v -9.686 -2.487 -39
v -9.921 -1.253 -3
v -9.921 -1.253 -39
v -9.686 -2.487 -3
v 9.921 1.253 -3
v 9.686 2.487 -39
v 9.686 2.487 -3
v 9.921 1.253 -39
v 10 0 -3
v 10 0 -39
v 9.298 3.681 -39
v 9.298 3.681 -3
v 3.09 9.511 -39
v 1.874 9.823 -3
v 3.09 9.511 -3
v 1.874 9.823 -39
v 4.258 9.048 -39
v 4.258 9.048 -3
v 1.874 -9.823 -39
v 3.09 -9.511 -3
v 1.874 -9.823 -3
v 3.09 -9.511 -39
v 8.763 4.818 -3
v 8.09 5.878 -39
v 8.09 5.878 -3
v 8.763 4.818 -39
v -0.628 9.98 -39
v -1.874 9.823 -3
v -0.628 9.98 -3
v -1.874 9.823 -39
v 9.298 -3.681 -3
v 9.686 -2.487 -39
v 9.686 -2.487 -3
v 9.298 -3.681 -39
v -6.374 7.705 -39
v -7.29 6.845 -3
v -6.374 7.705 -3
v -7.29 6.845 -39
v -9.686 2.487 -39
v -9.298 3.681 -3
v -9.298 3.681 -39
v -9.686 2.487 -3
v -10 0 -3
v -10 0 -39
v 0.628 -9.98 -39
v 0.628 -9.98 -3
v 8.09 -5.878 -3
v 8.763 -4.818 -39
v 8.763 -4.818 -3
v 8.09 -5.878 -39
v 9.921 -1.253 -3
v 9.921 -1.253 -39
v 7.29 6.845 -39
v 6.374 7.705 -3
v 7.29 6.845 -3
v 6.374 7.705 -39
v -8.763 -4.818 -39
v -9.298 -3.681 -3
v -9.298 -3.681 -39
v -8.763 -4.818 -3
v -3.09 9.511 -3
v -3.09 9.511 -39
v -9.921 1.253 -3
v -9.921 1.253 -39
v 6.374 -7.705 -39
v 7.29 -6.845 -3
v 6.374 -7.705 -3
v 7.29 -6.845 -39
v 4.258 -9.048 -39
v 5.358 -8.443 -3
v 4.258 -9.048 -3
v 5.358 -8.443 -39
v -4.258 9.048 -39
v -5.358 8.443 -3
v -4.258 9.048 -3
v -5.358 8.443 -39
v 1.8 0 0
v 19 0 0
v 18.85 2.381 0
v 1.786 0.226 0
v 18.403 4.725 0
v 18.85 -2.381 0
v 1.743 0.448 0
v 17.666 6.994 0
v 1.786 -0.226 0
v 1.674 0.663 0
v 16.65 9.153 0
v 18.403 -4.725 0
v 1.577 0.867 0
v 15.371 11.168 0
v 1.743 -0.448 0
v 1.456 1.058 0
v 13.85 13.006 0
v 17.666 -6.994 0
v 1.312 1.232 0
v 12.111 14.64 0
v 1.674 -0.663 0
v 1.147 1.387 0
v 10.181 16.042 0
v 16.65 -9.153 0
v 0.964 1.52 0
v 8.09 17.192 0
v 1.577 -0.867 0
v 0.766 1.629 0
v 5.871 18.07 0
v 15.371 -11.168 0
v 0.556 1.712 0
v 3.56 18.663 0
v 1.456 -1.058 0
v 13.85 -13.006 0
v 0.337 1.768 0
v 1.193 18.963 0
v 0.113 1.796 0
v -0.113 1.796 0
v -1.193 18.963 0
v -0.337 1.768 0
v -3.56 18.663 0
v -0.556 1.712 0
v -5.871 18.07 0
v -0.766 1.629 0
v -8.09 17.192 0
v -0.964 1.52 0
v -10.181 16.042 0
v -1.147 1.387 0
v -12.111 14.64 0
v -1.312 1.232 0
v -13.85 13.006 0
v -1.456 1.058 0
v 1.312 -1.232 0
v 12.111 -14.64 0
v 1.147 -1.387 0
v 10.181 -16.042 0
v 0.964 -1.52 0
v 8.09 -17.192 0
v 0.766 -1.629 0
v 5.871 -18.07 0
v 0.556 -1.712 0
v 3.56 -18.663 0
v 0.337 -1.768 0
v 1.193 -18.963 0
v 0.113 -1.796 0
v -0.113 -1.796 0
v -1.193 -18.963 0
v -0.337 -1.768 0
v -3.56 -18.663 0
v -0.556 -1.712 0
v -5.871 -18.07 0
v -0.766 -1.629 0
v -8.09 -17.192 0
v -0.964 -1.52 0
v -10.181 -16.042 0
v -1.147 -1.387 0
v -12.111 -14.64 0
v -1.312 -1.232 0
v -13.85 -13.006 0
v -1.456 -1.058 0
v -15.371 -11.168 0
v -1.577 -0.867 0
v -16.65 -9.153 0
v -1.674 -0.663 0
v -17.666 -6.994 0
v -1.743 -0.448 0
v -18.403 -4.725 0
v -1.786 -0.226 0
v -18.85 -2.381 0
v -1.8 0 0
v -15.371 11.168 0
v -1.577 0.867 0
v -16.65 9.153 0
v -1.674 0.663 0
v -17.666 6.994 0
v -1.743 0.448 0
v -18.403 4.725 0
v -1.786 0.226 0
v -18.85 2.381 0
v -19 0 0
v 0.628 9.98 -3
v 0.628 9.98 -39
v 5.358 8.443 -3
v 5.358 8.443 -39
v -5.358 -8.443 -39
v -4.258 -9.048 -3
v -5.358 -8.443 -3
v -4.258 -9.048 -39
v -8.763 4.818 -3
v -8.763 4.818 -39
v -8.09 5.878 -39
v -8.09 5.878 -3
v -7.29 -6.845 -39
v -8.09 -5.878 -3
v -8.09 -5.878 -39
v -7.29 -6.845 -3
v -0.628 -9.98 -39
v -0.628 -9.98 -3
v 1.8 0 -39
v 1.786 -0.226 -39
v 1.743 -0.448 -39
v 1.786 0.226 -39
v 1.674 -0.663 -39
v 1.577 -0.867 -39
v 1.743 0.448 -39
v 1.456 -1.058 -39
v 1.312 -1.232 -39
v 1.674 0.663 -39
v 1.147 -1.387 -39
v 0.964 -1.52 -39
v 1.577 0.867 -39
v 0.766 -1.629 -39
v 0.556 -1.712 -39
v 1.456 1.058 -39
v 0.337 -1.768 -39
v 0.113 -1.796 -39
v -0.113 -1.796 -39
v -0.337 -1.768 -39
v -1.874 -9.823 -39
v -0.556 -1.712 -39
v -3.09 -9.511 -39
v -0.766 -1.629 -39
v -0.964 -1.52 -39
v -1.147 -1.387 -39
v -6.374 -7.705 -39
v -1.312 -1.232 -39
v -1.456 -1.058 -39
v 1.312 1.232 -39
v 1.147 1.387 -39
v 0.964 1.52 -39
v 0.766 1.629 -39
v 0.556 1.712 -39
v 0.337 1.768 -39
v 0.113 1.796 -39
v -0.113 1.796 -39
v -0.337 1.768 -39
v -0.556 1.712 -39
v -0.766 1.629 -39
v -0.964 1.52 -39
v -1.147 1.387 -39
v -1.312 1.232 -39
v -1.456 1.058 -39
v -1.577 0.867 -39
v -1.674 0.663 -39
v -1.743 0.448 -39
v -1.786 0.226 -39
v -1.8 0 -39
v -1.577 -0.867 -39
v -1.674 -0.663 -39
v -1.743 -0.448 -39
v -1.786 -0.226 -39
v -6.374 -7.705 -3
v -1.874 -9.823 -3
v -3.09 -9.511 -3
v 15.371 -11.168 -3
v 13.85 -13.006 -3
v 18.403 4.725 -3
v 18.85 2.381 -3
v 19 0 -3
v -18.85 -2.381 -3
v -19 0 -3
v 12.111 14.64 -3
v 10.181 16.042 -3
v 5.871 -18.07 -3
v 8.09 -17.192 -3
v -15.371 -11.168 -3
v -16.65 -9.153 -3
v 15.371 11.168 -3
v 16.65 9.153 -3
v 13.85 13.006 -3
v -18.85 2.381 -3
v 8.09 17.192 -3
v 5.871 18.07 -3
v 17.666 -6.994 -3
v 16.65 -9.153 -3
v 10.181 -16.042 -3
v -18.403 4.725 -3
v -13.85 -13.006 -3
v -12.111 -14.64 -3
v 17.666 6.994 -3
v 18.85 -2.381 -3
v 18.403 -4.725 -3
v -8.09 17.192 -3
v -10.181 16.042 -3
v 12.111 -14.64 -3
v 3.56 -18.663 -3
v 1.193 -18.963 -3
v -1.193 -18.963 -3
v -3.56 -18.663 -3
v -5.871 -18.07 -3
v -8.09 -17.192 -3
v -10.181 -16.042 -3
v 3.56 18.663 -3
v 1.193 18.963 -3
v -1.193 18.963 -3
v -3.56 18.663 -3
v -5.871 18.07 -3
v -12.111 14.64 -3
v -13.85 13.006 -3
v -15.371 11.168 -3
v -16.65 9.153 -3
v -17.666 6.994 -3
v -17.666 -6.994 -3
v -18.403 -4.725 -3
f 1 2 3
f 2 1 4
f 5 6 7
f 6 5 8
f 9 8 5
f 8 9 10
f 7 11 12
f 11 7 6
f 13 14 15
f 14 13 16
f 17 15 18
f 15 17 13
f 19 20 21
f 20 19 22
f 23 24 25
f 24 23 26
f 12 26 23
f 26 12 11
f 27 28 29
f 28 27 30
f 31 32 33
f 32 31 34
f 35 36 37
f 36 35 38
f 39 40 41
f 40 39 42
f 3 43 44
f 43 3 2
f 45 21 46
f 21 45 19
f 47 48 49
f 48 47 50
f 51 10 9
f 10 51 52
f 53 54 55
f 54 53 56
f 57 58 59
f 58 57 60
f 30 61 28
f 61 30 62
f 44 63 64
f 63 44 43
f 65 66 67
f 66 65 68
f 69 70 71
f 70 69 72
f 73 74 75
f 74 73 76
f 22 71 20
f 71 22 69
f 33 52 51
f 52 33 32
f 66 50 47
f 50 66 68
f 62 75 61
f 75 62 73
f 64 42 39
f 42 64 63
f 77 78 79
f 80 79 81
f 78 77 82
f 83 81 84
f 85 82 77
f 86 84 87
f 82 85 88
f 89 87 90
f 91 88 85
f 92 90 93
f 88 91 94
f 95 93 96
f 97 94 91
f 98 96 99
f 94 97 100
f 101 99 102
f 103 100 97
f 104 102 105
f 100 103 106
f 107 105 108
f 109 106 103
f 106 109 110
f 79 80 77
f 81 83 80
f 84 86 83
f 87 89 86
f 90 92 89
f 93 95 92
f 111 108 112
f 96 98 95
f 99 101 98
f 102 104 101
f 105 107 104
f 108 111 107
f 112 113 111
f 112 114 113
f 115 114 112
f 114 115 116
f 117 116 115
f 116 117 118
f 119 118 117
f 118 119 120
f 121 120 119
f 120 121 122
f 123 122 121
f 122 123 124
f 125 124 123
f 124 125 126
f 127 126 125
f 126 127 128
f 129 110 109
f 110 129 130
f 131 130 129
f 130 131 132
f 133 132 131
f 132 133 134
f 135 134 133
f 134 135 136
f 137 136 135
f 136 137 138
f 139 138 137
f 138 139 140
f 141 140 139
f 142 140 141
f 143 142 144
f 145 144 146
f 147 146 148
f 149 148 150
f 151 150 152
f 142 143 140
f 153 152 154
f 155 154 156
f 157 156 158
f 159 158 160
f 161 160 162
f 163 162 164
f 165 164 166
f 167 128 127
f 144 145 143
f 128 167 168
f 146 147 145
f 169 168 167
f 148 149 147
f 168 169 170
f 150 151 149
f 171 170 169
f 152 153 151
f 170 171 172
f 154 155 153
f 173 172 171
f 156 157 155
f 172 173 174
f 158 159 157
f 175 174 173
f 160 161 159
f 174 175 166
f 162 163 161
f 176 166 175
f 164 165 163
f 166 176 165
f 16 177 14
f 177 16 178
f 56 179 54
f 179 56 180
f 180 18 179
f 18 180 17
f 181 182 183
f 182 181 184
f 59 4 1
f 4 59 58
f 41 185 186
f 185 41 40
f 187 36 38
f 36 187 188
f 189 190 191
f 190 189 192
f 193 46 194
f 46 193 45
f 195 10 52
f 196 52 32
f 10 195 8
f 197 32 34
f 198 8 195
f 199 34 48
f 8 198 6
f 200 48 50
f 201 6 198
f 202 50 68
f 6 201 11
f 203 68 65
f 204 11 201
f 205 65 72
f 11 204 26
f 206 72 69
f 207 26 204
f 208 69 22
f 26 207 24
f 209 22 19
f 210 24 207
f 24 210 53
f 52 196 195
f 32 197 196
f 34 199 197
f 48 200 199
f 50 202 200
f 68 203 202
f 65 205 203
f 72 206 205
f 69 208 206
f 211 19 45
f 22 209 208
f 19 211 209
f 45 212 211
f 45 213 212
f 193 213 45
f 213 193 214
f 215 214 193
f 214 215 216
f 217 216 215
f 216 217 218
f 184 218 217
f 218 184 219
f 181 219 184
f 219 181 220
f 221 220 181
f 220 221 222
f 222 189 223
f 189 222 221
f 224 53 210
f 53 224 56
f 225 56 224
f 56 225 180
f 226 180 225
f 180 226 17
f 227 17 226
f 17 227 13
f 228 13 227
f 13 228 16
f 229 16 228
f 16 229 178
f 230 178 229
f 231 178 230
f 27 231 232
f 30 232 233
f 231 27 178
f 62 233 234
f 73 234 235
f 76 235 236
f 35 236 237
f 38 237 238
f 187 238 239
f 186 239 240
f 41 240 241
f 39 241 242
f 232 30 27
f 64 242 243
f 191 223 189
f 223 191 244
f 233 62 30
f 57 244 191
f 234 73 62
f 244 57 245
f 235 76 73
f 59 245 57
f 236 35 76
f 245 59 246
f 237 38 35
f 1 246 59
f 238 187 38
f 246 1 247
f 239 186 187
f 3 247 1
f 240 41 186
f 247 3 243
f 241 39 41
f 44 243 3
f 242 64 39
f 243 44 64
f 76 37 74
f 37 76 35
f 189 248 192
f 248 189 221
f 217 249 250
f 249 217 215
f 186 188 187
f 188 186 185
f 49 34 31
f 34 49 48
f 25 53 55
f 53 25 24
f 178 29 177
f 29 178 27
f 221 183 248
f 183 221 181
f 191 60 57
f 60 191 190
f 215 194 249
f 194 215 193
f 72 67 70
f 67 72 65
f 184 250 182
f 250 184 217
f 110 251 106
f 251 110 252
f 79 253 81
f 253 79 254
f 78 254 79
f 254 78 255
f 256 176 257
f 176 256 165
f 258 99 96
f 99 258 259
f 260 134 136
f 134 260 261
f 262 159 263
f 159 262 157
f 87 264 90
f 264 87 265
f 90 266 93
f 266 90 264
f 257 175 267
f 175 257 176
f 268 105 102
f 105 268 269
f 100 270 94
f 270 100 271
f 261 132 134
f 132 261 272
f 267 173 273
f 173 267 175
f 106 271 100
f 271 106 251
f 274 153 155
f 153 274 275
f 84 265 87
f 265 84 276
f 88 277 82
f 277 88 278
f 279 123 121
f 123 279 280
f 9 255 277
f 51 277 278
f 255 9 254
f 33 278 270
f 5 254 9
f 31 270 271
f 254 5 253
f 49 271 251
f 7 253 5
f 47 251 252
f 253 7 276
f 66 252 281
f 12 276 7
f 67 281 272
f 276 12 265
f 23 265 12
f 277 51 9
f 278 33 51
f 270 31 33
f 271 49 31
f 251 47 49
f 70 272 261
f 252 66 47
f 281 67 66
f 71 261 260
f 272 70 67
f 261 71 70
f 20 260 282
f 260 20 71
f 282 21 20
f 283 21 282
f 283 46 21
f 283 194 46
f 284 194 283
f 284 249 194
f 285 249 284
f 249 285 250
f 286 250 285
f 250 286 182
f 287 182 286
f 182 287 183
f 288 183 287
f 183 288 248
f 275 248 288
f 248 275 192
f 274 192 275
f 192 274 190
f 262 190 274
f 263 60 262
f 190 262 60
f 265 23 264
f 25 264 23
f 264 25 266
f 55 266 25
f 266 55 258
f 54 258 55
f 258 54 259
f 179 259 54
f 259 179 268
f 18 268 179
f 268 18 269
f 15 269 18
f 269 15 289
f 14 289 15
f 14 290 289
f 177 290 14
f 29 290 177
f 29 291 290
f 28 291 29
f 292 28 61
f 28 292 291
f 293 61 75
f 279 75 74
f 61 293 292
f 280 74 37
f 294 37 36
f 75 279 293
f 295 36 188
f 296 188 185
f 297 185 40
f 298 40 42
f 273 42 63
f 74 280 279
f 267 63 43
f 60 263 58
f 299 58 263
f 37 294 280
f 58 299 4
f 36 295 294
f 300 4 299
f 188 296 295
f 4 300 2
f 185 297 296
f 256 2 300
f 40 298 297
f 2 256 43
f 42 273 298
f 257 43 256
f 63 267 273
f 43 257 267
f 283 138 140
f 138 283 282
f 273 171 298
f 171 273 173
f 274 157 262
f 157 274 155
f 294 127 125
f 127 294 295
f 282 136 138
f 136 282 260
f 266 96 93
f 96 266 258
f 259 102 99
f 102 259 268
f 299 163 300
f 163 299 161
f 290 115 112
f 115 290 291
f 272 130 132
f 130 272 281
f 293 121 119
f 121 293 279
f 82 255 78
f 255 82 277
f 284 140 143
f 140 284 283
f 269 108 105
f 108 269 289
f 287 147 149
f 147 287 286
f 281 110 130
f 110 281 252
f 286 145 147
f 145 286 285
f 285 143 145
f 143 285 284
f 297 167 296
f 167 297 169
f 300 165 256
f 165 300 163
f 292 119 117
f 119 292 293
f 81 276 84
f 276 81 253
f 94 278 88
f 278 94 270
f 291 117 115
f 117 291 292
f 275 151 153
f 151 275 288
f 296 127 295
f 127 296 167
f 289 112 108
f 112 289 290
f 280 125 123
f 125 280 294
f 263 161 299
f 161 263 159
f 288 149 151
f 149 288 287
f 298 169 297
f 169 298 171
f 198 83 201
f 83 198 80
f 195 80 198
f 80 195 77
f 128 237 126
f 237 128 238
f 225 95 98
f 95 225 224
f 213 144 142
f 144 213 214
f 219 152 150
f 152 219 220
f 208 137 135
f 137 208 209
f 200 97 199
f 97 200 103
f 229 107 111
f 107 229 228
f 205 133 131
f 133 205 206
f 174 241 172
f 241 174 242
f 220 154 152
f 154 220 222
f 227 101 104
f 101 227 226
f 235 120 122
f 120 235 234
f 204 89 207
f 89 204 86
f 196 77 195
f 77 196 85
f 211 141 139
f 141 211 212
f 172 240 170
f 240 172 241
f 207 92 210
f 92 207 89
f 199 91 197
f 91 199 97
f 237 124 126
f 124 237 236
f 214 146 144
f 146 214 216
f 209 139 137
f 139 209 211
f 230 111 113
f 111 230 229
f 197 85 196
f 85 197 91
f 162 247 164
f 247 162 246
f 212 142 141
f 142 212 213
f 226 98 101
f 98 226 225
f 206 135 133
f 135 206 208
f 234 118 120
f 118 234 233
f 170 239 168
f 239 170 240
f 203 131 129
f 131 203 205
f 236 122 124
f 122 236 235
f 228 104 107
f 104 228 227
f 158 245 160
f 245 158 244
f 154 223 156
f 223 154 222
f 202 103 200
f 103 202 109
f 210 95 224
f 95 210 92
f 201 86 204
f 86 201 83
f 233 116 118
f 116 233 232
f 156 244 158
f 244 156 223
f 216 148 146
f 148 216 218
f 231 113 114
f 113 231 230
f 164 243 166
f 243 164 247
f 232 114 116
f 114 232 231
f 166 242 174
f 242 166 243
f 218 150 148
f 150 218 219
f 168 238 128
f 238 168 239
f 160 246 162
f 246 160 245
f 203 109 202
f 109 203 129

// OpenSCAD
$fn = 50;


difference() {
	union() {
		translate(v = [0, 0, -39.0000000000]) {
			cylinder(h = 39, r = 10.0000000000);
		}
		translate(v = [0, 0, -3.0000000000]) {
			cylinder(h = 3, r = 19.0000000000);
		}
	}
	union() {
		#translate(v = [0, 0, -39]) {
			cylinder(h = 39, r = 1.8000000000);
		}
	}
}
